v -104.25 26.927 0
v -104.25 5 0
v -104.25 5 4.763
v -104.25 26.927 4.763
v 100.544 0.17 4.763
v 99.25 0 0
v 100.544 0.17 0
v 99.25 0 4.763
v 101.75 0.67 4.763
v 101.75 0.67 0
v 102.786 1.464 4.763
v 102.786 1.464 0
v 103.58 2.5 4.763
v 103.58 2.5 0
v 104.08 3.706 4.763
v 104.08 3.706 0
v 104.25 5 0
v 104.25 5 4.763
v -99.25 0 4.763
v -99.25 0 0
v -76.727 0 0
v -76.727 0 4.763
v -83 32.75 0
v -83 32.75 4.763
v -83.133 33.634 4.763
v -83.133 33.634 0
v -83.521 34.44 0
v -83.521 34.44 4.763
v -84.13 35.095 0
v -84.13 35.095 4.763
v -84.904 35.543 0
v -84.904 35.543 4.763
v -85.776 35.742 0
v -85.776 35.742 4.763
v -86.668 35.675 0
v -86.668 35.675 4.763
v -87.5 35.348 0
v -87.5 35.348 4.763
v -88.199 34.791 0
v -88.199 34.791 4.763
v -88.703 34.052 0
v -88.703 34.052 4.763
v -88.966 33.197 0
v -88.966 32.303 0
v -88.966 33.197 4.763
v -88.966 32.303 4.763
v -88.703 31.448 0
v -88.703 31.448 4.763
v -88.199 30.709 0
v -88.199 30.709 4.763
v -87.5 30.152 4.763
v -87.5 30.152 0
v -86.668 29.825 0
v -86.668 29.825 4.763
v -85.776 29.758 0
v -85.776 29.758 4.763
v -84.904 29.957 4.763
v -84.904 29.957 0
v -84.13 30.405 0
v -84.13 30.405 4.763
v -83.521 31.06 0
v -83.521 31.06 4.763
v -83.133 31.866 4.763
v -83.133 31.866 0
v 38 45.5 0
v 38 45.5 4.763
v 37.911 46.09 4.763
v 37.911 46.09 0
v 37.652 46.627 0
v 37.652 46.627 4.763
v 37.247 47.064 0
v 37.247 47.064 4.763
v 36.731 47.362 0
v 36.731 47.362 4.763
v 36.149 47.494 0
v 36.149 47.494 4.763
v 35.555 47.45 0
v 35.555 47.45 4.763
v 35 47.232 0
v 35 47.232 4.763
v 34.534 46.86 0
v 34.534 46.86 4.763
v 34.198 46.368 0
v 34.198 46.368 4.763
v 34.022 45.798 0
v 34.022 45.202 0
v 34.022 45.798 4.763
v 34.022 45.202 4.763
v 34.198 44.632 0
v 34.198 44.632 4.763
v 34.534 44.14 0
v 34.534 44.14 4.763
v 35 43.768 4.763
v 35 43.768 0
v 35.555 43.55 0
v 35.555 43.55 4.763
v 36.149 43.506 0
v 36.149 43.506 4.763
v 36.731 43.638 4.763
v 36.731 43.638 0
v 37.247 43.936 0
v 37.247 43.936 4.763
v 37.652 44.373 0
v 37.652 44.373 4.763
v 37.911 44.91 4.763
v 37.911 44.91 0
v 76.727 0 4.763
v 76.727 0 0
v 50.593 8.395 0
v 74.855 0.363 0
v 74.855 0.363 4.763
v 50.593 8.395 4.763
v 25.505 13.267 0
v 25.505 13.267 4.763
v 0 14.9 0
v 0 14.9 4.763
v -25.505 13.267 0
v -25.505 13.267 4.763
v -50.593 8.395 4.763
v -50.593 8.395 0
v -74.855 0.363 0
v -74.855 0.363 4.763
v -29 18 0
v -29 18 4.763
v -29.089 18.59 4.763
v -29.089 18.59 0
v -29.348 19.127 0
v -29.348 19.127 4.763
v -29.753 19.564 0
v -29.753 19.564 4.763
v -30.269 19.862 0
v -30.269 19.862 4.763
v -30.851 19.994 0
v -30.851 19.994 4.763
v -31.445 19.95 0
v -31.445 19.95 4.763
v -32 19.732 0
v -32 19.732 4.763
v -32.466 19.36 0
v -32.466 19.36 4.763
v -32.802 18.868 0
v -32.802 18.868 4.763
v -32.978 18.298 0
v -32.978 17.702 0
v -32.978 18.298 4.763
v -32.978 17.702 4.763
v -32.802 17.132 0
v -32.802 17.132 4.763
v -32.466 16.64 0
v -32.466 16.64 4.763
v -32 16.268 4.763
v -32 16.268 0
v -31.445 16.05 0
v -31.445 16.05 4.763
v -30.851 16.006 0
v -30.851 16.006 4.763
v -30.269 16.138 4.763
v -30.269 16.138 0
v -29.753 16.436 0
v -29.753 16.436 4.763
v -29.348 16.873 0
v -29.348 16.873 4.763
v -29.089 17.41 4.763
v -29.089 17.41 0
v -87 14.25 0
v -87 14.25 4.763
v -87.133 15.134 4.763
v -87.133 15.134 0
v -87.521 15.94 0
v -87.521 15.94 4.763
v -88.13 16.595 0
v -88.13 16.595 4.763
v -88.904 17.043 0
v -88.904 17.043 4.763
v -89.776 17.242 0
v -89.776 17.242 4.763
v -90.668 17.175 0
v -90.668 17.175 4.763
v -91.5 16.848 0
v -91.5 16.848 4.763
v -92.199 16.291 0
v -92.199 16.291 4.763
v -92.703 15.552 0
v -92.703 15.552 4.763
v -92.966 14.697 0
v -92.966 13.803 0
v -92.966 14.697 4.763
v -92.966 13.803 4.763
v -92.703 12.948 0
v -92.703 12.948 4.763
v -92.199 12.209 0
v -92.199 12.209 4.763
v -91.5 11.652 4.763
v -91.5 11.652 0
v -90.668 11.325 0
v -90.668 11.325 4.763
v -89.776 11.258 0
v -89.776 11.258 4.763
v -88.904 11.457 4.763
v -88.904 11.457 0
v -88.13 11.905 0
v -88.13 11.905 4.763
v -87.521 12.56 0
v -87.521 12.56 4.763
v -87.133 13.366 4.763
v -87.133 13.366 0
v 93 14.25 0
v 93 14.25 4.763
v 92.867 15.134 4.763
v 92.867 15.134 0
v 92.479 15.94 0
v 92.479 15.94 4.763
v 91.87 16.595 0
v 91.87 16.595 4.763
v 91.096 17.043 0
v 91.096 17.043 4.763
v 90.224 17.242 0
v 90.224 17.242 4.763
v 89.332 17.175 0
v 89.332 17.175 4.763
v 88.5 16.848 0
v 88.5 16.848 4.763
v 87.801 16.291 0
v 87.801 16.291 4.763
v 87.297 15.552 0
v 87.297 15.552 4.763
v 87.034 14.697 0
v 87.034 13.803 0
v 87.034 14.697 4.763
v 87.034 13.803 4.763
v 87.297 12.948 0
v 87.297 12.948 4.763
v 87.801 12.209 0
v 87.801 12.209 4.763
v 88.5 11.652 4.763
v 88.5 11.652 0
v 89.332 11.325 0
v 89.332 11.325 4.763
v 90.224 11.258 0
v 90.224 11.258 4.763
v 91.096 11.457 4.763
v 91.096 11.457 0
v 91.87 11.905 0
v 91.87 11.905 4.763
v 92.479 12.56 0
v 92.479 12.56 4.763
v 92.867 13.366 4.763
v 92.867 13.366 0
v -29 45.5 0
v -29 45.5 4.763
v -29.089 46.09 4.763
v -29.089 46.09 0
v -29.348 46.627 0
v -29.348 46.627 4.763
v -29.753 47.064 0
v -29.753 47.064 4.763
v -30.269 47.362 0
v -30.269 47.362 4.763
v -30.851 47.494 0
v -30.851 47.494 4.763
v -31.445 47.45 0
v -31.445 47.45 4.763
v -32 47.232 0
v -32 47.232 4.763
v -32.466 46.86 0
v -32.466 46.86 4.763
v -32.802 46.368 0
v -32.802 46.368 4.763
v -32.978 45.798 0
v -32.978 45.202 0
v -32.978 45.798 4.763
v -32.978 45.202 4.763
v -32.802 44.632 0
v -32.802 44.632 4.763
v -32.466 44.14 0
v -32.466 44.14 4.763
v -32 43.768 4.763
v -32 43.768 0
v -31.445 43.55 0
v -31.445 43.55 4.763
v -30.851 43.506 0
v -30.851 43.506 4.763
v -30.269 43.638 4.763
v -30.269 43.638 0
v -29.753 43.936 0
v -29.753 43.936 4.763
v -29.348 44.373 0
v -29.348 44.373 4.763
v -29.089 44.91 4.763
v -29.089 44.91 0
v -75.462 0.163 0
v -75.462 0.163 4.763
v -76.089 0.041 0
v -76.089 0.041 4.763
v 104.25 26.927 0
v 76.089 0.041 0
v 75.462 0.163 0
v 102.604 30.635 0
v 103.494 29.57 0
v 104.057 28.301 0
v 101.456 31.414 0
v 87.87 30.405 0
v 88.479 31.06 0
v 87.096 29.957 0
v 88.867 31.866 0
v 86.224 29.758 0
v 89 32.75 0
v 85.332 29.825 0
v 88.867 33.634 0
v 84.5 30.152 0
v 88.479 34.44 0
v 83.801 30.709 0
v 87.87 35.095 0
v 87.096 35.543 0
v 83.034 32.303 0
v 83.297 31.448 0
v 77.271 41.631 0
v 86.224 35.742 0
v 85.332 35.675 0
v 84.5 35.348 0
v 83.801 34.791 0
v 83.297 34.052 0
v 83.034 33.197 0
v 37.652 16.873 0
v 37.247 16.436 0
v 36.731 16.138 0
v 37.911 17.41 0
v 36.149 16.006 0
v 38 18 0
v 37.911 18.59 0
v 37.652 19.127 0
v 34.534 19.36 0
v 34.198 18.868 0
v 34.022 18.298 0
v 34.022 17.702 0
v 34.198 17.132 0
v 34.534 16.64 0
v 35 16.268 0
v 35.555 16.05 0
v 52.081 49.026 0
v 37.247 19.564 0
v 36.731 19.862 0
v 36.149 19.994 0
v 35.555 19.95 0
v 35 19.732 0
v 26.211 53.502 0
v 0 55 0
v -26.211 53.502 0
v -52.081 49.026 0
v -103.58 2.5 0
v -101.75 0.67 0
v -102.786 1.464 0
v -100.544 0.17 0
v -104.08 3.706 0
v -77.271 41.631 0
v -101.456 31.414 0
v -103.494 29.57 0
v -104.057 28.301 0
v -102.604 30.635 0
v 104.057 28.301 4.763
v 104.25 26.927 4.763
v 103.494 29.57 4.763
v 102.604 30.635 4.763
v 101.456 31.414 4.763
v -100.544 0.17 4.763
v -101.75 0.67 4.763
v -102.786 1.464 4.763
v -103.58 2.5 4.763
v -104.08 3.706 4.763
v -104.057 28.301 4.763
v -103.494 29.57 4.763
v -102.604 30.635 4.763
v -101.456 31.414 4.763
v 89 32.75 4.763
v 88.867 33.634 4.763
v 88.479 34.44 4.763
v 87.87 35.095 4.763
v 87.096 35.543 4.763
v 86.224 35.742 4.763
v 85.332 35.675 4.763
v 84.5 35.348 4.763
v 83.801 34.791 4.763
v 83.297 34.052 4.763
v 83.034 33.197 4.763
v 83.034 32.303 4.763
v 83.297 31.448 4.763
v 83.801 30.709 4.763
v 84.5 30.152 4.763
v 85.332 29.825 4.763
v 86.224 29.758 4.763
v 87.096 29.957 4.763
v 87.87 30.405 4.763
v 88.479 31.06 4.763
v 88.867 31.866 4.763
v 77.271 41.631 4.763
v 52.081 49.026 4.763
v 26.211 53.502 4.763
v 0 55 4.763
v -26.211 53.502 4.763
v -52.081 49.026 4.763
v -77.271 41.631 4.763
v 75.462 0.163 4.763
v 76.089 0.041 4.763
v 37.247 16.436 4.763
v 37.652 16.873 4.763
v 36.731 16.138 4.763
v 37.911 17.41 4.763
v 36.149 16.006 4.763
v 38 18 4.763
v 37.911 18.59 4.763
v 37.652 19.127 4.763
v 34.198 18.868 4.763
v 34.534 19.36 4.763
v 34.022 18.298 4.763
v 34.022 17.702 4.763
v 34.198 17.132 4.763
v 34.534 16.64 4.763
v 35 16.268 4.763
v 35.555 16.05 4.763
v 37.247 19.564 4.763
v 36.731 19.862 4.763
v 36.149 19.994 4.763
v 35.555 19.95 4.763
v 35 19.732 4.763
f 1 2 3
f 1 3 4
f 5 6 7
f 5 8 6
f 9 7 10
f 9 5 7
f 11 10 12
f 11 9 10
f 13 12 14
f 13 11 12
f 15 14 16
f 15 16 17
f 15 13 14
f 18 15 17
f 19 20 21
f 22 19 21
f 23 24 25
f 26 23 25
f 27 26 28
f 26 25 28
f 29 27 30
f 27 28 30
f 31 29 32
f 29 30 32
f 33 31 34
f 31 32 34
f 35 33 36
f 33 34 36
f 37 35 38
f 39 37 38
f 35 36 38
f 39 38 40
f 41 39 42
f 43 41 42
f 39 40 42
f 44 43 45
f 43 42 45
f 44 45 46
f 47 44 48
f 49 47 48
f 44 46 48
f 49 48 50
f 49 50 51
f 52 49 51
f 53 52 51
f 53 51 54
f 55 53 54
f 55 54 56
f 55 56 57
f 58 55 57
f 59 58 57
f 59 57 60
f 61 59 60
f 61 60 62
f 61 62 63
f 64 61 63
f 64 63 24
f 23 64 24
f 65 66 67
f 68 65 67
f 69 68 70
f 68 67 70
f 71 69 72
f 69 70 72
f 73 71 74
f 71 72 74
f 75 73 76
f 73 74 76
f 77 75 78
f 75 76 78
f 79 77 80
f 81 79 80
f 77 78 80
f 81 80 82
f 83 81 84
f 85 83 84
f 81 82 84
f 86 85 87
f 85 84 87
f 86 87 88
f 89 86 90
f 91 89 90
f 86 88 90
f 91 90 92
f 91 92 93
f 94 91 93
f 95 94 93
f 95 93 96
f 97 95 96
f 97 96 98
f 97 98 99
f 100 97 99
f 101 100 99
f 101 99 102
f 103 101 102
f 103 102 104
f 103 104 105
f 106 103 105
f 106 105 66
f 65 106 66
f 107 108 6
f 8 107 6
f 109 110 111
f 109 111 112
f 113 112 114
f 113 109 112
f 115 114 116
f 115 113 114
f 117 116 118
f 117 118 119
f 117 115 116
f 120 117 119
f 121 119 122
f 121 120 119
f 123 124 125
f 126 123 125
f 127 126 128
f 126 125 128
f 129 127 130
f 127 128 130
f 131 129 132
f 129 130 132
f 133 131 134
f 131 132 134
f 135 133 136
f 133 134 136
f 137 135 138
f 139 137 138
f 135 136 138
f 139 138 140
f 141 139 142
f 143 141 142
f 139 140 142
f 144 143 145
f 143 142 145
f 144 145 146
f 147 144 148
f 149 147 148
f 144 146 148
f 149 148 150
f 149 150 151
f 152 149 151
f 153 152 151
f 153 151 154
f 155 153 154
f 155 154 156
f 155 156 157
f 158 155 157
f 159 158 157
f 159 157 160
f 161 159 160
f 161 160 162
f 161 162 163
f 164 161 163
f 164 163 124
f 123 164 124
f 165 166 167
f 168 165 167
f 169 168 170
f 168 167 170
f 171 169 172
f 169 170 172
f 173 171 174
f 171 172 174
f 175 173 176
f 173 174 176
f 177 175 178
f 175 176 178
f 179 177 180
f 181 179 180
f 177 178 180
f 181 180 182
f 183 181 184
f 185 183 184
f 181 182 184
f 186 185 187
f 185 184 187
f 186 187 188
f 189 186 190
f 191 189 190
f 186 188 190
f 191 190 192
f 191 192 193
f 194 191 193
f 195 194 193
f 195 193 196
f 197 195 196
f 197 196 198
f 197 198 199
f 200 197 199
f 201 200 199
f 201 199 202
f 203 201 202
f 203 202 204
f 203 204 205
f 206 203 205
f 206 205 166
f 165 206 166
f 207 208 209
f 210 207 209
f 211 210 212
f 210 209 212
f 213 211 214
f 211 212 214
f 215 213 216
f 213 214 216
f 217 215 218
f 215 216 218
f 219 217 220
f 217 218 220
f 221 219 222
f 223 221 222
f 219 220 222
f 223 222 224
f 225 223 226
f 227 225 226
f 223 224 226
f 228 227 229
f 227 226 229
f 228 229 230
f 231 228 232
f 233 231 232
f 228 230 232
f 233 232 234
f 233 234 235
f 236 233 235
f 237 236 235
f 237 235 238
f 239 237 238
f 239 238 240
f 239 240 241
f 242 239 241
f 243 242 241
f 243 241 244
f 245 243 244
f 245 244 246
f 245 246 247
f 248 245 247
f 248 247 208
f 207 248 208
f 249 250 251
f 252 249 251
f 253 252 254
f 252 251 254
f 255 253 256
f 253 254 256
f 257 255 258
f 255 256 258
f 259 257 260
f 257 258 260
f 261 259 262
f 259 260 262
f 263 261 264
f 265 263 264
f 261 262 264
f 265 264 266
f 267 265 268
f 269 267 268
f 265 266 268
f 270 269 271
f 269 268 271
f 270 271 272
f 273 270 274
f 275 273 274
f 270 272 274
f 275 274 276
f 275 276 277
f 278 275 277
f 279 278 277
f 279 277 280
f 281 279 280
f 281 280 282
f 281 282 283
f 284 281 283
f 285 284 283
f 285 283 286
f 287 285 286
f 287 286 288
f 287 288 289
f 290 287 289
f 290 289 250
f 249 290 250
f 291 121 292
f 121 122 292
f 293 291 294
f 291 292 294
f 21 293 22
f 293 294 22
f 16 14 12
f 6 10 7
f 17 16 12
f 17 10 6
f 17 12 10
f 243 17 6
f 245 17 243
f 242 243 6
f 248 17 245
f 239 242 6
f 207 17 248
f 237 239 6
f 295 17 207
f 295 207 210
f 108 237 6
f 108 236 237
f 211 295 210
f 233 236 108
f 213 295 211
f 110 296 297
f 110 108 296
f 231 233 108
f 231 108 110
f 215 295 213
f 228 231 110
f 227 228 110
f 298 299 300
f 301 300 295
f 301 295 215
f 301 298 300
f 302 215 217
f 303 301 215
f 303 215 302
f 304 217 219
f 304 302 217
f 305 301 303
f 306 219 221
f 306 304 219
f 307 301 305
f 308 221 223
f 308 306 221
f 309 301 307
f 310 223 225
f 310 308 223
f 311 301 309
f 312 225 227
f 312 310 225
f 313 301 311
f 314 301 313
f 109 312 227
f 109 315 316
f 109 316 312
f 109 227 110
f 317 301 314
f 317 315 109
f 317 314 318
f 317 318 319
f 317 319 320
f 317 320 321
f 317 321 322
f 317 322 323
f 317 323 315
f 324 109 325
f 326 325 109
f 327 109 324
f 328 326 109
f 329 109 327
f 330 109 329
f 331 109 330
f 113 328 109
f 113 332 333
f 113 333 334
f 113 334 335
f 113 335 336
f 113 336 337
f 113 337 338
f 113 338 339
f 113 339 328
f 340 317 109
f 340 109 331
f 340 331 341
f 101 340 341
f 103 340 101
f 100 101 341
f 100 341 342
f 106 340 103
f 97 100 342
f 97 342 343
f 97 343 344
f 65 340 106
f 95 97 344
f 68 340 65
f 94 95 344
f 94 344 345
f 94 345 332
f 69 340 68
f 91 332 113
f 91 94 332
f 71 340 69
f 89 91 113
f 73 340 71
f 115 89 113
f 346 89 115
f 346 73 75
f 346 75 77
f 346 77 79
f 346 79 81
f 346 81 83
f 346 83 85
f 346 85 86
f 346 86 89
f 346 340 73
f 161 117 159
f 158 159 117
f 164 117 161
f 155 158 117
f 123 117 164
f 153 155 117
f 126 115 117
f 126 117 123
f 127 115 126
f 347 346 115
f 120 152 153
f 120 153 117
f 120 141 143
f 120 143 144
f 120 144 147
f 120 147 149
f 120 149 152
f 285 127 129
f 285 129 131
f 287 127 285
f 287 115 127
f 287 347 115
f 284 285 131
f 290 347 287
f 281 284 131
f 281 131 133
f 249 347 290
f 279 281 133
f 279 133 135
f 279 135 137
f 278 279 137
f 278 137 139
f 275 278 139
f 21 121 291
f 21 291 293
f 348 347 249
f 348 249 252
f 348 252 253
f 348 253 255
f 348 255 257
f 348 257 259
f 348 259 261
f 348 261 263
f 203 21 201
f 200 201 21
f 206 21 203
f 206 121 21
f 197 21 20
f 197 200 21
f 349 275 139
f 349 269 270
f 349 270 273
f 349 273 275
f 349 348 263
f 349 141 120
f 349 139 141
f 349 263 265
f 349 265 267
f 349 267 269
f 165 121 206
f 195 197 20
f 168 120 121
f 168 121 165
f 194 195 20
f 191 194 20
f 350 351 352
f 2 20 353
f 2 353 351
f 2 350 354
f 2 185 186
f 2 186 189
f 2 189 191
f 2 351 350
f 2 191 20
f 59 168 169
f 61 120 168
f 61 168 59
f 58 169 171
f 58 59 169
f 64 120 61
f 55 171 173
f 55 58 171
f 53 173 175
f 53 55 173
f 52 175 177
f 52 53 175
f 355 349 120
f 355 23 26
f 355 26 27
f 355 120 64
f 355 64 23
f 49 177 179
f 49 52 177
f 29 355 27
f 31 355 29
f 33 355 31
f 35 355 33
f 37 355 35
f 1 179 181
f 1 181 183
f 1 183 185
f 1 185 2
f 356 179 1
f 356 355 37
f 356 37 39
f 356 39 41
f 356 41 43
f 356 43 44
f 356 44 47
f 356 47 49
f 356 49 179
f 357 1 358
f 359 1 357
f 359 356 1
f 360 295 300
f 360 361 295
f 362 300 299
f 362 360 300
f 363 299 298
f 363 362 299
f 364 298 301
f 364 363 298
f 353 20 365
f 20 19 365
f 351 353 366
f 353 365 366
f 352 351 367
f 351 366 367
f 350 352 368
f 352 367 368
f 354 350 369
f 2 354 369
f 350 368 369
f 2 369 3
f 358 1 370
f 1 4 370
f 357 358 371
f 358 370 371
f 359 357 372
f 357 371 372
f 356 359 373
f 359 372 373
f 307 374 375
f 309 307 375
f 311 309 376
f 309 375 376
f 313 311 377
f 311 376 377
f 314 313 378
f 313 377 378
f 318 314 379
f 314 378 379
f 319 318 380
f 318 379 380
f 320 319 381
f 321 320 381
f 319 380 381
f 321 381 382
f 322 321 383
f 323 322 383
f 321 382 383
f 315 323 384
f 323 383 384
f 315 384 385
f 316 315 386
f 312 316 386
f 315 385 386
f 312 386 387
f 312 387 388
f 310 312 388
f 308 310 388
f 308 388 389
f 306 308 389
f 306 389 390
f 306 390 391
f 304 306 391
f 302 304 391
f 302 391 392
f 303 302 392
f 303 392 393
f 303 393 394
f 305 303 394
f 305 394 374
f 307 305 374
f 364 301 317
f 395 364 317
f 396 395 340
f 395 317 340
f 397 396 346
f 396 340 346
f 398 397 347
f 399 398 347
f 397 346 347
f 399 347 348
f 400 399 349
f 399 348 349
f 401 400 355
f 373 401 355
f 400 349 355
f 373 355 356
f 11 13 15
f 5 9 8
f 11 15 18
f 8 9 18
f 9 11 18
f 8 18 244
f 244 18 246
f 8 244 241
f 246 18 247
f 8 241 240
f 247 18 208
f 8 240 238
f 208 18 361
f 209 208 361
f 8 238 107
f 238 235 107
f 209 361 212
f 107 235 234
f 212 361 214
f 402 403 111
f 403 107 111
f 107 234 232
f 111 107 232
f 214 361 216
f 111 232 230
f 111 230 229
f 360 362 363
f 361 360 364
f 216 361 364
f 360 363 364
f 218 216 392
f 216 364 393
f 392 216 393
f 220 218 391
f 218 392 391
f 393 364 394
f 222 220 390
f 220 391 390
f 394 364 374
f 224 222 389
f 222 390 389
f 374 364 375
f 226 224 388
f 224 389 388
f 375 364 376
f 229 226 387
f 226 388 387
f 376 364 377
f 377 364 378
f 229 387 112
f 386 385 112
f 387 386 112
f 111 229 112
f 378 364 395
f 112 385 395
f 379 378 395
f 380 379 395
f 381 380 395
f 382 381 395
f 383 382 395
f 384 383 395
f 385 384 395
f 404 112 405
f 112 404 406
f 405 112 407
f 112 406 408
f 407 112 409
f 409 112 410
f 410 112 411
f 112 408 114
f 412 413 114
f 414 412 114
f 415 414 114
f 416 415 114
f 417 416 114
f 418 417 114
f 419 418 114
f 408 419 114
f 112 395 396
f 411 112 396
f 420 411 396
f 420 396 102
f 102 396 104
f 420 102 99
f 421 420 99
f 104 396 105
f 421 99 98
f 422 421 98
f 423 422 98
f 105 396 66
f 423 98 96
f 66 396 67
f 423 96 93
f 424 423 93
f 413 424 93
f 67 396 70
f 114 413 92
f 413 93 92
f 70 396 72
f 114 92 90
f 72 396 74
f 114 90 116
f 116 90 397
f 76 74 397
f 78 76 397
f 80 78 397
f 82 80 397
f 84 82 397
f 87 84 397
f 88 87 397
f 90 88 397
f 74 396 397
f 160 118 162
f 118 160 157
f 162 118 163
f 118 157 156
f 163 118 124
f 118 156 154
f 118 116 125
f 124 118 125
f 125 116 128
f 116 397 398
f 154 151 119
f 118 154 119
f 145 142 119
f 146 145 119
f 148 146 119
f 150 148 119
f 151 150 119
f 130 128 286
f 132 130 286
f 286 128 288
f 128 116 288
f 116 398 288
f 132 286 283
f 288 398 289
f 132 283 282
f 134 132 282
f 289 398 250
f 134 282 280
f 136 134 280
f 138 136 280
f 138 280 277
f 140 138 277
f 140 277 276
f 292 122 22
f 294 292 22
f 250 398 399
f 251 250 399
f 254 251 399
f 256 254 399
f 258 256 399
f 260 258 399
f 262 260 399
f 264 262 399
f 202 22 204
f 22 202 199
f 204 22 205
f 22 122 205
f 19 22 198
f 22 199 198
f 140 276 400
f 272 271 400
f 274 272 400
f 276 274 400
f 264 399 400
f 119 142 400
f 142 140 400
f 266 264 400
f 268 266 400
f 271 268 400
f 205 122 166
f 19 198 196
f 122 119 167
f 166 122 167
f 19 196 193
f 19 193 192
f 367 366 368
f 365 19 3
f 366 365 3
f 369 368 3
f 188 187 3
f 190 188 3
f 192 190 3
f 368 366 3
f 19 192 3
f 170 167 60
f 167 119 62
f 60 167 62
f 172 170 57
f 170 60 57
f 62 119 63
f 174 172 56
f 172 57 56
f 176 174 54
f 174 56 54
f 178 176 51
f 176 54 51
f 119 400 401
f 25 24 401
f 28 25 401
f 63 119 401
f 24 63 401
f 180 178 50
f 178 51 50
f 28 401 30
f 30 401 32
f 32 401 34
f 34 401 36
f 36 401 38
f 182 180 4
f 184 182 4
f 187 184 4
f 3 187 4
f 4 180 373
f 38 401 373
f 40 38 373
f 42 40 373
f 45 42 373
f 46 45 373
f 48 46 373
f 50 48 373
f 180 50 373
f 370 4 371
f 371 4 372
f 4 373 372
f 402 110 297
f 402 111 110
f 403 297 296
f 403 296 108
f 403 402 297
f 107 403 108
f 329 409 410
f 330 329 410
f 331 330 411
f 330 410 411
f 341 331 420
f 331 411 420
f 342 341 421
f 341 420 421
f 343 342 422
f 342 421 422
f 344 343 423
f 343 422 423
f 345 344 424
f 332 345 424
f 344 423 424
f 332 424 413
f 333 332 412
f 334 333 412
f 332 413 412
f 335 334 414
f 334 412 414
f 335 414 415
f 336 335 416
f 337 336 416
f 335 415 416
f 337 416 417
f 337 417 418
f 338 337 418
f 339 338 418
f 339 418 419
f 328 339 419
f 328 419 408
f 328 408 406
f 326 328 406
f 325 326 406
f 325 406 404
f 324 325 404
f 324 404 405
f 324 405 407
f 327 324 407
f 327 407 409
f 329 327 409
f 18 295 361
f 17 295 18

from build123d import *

# Parameters (mm, degrees)
PAD_DEPTH     = 4.763
SKETCH001_R   = 2
SKETCH001_R_2 = 3
POCKET_DEPTH  = 4.764
FILLET_R      = 5


with BuildPart() as part:
    # Sketch → Pad (new body)
    with BuildSketch(Plane.XY):
        with BuildLine():
            ThreePointArc((75.749521, 0), (0, 14.9), (-75.749521, 0))
            Line((-104.25, 0), (-75.749521, 0))
            Line((-104.25, 0), (-104.25, 30.01692))
            ThreePointArc((104.25, 30.01692), (0, 55), (-104.25, 30.01692))
            Line((104.25, 30.01692), (104.25, 0))
            Line((75.749521, 0), (104.25, 0))
        make_face()
    extrude(amount=PAD_DEPTH)

    # Sketch001 → Pocket (cut, through all)
    with BuildSketch(Plane.XY.offset(4.763)):
        with Locations((-31, 45.5)):
            Circle(SKETCH001_R)
        with Locations((36, 45.5)):
            Circle(SKETCH001_R)
        with Locations((36, 18)):
            Circle(SKETCH001_R)
        with Locations((-31, 18)):
            Circle(SKETCH001_R)
        with Locations((-90, 14.25)):
            Circle(SKETCH001_R_2)
        with Locations((-86, 32.75)):
            Circle(SKETCH001_R_2)
        with Locations((86, 32.75)):
            Circle(SKETCH001_R_2)
        with Locations((90, 14.25)):
            Circle(SKETCH001_R_2)
    extrude(amount=-POCKET_DEPTH, mode=Mode.SUBTRACT)

    # Fillet
    fillet_edges = [part.edges().sort_by_distance(p)[0] for p in [
        (-104.25, 30.01692, 2.3815),
        (-104.25, 0, 2.3815),
        (104.25, 30.01692, 2.3815),
        (-75.749521, 0, 2.3815),
        (75.749521, 0, 2.3815),
        (104.25, 0, 2.3815),
    ]]
    fillet(fillet_edges, radius=FILLET_R)


solid = part.part
